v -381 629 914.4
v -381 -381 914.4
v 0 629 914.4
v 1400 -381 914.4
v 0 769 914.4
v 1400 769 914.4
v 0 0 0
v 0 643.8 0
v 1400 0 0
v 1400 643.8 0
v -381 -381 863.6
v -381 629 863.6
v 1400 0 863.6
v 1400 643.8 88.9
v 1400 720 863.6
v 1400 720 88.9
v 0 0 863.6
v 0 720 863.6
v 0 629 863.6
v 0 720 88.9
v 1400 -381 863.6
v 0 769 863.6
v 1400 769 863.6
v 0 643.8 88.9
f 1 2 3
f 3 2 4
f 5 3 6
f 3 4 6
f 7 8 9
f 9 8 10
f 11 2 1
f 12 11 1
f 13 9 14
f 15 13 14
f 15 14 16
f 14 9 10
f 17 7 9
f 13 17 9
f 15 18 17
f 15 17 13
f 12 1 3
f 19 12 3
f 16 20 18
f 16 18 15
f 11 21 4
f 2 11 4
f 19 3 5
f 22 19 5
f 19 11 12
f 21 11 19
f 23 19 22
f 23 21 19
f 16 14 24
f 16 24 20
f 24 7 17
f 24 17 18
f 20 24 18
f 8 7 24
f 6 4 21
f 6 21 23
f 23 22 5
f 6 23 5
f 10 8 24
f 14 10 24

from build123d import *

# Parameters (mm, degrees)
F0_W     = 1400
F0_H     = 720
F1_DEPTH = 863.6
F2_W     = 76.2
F2_H     = 88.9
F3_DEPTH = 1400.001
F4_W     = 1150
F4_H     = 50.8
F5_DEPTH = 1400
F6_DEPTH = 381
F7_W     = 381
F7_H     = 140
F8_DEPTH = 50.8


with BuildPart() as f1:
    # F0 (on Top) → F1 (new body)
    with BuildSketch(Plane.XY):
        with Locations((700, 360)):
            Rectangle(F0_W, F0_H)
    extrude(amount=F1_DEPTH)

    # F2 (on Right) → F3 (cut, through all)
    with BuildSketch(Plane.YZ):
        with Locations((681.9, 44.45)):
            Rectangle(F2_W, F2_H)
    extrude(amount=F3_DEPTH, mode=Mode.SUBTRACT)


with BuildPart() as f5:
    # F4 (on Right) → F5 (new body, through all)
    with BuildSketch(Plane.YZ):
        with Locations((194, 889)):
            Rectangle(F4_W, F4_H)
    extrude(amount=F5_DEPTH)

    # F6 (add): a face of the model
    f6_faces = [f5.faces().sort_by_distance(p)[0] for p in [
        (0, 194, 889),
    ]]
    extrude(f6_faces, amount=F6_DEPTH)

    # F7 (on face) → F8 (cut, through all)
    with BuildSketch(Plane.XY.offset(914.4)):
        with Locations((-190.5, 699)):
            Rectangle(F7_W, F7_H)
    extrude(amount=-F8_DEPTH, mode=Mode.SUBTRACT)


solid = Compound([f1.part, f5.part])
